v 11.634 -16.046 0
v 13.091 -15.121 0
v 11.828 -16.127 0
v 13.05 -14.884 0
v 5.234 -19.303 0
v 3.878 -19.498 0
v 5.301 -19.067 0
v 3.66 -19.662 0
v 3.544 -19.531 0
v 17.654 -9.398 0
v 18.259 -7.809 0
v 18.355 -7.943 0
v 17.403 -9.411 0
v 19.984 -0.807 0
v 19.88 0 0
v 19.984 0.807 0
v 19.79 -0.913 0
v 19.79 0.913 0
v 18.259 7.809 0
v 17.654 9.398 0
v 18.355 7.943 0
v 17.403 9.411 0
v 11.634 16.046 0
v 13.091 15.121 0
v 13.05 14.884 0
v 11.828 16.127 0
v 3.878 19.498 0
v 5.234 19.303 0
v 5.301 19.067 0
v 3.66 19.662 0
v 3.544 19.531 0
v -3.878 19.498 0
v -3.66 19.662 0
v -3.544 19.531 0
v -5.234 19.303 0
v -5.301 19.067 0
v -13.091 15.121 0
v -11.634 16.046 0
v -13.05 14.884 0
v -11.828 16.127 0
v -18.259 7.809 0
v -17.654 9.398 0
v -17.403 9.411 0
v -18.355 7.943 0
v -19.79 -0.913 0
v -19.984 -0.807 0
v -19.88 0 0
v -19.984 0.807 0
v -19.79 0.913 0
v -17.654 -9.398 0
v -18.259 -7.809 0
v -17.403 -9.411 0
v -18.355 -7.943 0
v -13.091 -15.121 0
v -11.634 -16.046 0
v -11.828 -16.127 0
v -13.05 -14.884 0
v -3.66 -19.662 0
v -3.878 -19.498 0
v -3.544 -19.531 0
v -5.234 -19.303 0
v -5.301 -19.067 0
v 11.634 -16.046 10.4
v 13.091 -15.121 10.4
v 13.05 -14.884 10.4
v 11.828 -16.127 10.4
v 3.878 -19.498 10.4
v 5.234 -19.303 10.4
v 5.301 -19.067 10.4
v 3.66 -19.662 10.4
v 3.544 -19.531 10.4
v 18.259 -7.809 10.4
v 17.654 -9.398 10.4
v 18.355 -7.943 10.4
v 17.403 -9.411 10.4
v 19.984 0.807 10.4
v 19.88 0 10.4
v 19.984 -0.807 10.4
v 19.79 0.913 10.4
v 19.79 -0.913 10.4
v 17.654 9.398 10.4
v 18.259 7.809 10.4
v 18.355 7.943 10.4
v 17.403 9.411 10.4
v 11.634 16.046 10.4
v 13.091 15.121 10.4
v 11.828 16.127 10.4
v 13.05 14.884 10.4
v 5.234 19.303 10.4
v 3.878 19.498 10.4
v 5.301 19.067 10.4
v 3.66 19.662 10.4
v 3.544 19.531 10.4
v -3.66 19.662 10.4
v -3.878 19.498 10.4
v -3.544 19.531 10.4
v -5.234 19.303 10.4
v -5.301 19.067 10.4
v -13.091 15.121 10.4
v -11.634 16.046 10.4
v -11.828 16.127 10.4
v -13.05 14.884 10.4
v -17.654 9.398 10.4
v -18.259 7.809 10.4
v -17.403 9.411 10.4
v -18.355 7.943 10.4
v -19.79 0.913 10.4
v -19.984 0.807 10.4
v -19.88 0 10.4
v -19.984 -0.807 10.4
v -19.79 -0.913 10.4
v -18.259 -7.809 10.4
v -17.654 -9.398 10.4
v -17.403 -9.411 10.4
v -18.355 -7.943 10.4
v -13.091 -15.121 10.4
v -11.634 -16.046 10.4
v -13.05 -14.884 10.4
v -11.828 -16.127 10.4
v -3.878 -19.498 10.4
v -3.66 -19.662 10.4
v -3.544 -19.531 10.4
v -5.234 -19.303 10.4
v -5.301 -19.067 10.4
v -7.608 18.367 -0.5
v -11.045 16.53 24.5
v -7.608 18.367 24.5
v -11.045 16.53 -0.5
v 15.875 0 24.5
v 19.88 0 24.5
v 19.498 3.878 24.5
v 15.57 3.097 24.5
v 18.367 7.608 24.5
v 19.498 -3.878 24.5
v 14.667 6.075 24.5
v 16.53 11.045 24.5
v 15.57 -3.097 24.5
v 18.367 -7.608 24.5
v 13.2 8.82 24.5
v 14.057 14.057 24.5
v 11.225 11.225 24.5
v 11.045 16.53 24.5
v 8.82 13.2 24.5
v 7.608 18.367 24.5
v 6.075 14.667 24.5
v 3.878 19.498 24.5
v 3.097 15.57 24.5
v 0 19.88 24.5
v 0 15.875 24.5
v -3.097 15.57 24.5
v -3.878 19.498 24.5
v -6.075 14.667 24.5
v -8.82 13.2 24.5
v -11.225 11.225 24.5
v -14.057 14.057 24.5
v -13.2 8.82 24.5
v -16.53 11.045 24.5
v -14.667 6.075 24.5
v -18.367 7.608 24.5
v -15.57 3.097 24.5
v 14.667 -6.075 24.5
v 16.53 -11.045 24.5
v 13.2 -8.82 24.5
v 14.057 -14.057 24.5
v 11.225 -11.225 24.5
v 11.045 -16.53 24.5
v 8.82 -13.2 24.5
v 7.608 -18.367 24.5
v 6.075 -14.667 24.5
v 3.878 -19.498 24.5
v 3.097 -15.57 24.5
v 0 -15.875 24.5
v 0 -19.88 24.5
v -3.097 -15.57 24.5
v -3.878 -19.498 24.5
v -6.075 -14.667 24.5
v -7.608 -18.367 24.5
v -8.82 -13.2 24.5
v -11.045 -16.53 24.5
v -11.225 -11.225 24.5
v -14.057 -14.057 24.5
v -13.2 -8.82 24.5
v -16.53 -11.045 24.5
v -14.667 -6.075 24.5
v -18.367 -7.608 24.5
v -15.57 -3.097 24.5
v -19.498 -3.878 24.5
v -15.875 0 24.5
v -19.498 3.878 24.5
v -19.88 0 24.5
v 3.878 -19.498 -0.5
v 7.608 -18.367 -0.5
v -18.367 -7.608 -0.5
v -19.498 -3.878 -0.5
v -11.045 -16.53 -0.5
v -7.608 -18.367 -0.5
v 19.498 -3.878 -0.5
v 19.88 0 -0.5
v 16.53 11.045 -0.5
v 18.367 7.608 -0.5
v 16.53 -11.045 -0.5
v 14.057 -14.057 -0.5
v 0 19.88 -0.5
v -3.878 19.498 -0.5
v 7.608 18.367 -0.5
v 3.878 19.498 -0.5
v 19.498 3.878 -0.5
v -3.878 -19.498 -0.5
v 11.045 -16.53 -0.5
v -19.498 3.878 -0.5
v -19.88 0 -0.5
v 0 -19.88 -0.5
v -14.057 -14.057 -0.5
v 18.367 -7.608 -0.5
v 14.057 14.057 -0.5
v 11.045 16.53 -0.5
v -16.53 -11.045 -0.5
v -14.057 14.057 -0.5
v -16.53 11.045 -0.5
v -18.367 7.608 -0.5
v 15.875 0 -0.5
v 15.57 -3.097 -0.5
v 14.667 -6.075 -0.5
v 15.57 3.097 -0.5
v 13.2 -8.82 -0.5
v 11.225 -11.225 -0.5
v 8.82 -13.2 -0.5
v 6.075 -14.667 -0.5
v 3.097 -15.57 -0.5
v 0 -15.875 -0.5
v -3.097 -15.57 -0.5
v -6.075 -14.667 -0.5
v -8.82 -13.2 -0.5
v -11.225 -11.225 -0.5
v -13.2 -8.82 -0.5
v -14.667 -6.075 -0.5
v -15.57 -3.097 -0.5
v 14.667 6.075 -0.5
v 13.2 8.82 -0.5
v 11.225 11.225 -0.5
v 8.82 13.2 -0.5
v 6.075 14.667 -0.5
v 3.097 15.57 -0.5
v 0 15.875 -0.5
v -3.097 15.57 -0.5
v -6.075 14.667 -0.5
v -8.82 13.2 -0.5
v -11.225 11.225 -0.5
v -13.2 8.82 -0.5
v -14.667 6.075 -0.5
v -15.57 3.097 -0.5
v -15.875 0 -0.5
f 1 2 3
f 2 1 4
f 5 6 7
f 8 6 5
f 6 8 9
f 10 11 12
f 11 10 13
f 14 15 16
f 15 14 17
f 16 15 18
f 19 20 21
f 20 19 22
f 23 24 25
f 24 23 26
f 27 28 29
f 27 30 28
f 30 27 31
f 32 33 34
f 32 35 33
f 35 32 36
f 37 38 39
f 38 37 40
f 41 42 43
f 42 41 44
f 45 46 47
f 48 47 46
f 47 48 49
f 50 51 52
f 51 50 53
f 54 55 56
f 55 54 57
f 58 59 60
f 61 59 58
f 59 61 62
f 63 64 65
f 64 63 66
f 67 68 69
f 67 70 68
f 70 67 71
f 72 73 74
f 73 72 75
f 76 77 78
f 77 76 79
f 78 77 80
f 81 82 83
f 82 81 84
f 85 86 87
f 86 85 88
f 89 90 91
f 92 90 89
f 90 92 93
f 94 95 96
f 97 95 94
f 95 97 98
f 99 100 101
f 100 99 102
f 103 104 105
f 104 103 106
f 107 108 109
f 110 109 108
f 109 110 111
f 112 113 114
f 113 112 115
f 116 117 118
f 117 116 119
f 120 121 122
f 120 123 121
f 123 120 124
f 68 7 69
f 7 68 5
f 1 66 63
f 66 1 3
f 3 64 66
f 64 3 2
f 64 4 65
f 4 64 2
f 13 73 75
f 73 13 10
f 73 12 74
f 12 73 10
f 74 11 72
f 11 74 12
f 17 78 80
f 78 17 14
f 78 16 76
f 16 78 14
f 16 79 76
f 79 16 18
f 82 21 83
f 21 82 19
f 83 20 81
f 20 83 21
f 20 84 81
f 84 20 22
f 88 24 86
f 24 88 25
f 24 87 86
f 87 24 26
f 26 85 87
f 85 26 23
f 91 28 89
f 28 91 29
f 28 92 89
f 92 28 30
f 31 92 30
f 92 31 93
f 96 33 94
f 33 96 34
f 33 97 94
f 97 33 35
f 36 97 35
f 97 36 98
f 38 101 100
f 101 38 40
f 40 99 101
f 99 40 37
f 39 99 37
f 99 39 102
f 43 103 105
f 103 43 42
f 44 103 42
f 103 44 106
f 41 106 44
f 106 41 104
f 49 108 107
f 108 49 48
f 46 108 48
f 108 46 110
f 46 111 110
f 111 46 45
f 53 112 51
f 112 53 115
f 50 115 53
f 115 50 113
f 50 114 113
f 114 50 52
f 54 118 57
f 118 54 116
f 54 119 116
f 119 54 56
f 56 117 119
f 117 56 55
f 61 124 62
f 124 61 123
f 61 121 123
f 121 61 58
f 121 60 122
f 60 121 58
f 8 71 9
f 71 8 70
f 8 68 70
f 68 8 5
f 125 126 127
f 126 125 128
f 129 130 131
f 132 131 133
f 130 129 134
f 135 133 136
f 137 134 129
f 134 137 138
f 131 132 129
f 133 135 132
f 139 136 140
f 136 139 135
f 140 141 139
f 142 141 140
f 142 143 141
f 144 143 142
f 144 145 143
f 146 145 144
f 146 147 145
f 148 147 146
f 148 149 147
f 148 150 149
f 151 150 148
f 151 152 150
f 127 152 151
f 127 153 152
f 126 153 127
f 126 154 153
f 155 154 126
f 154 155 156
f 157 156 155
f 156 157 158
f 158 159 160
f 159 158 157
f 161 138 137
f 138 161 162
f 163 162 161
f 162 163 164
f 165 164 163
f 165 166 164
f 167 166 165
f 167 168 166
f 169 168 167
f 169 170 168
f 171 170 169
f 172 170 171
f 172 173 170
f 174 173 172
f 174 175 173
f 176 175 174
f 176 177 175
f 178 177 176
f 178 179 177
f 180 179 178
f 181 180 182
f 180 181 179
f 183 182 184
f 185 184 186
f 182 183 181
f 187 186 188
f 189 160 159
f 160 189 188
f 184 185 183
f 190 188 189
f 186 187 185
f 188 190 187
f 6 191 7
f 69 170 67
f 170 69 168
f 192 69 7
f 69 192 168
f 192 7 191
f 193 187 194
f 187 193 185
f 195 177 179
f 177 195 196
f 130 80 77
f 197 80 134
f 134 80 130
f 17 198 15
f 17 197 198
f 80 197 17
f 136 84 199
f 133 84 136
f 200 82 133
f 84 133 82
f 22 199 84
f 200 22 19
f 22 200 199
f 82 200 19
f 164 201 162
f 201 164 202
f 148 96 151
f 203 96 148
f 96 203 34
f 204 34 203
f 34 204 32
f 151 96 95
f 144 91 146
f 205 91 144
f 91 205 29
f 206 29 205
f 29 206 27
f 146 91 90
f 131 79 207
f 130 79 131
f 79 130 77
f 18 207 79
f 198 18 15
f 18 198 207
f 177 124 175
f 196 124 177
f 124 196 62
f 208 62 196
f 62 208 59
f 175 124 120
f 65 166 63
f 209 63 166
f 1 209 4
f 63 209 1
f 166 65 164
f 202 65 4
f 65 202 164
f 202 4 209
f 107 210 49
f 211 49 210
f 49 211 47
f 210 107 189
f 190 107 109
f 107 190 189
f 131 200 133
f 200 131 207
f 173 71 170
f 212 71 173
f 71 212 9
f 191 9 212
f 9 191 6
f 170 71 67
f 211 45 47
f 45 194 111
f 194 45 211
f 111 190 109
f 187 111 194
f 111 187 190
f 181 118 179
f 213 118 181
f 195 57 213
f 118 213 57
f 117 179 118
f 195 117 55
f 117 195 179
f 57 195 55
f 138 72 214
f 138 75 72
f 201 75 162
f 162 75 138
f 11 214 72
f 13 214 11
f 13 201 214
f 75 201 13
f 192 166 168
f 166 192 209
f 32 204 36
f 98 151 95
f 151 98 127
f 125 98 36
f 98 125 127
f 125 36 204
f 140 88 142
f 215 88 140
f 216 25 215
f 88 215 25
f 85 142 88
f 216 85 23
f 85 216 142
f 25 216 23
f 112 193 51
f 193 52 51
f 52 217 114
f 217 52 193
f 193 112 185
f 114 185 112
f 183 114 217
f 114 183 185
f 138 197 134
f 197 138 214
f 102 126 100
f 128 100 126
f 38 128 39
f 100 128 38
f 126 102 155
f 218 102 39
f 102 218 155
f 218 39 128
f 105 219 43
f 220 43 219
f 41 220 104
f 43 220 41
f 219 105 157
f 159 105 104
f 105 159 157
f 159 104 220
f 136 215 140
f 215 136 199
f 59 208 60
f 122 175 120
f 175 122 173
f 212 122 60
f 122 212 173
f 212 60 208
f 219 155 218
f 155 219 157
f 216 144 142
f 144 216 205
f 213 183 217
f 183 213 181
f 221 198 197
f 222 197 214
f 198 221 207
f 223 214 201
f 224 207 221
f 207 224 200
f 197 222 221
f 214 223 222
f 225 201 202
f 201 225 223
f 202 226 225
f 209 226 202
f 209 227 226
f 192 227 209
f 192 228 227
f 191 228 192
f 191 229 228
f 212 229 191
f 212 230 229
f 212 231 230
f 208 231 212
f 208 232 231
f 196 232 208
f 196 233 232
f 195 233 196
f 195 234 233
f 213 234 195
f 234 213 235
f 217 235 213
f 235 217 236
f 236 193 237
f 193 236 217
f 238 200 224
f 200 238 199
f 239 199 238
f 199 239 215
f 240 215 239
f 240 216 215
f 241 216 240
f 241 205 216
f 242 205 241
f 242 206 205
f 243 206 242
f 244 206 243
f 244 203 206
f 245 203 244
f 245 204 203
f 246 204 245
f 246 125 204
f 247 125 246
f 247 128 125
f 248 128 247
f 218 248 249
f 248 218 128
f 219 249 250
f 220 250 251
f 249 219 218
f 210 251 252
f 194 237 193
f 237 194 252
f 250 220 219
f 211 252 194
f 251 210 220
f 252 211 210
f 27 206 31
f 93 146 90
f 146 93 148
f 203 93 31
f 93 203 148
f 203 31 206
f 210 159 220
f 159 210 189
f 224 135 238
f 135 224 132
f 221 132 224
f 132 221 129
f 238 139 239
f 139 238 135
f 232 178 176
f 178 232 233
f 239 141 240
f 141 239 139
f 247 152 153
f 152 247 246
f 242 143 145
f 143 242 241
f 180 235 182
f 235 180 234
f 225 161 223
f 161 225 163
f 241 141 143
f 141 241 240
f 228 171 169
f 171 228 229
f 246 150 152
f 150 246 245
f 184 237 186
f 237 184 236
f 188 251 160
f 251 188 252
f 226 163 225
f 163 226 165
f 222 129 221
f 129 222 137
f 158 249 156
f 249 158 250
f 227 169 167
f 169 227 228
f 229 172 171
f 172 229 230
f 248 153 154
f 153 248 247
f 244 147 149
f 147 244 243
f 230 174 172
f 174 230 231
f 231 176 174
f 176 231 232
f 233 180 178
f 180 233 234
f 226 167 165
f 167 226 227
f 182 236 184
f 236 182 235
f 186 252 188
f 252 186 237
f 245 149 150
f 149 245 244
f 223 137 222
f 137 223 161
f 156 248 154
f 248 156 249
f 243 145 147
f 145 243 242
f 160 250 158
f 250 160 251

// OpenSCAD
$fn = 32;

// ----------------------------------------------------------------------
// Two-module gear rim: z14 m2.5 and z20 m1.5, 24 mm wide
// ----------------------------------------------------------------------

// --- parameters (mm) ---
module_a = 2.5;           // first tooth module
teeth_a = 14;             // first band tooth count
module_b = 1.5;           // second tooth module
teeth_b = 20;             // second band tooth count
band_h = 10;              // height of one tooth band
web_t = 4;                // web thickness between the bands
total = 24;               // overall width over both bands
root_r = 14.38;           // root radius of the coarse band
hub_r = 19.88;            // hub radius
bore_d = 31.75;           // hub bore
hole_count = 4;           // lightening holes
hole_r = 10.94;           // lightening hole circle radius
hole_d = 4;               // lightening hole diameter

band_a = [[14.259, -1.82], [17.559, -1.916], [18.774, -1.469], [19.984, -0.807], [19.984, 0.807], [18.774, 1.469], [17.559, 1.916], [14.259, 1.82], [13.637, 4.547], [16.651, 5.892], [17.552, 6.823], [18.355, 7.943], [17.654, 9.398], [16.278, 9.469], [14.989, 9.345], [12.058, 7.827], [10.313, 10.014], [12.446, 12.533], [12.854, 13.763], [13.091, 15.121], [11.828, 16.127], [10.557, 15.594], [9.45, 14.923], [7.468, 12.283], [4.947, 13.497], [5.775, 16.692], [5.609, 17.977], [5.234, 19.303], [3.66, 19.662], [2.746, 18.63], [2.039, 17.545], [1.399, 14.307], [-1.399, 14.307], [-2.039, 17.545], [-2.746, 18.63], [-3.66, 19.662], [-5.234, 19.303], [-5.609, 17.977], [-5.775, 16.692], [-4.947, 13.497], [-7.468, 12.283], [-9.45, 14.923], [-10.557, 15.594], [-11.828, 16.127], [-13.091, 15.121], [-12.854, 13.763], [-12.446, 12.533], [-10.313, 10.014], [-12.058, 7.827], [-14.989, 9.345], [-16.278, 9.469], [-17.654, 9.398], [-18.355, 7.943], [-17.552, 6.823], [-16.651, 5.892], [-13.637, 4.547], [-14.259, 1.82], [-17.559, 1.916], [-18.774, 1.469], [-19.984, 0.807], [-19.984, -0.807], [-18.774, -1.469], [-17.559, -1.916], [-14.259, -1.82], [-13.637, -4.547], [-16.651, -5.892], [-17.552, -6.823], [-18.355, -7.943], [-17.654, -9.398], [-16.278, -9.469], [-14.989, -9.345], [-12.058, -7.827], [-10.313, -10.014], [-12.446, -12.533], [-12.854, -13.763], [-13.091, -15.121], [-11.828, -16.127], [-10.557, -15.594], [-9.45, -14.923], [-7.468, -12.283], [-4.947, -13.497], [-5.775, -16.692], [-5.609, -17.977], [-5.234, -19.303], [-3.66, -19.662], [-2.746, -18.63], [-2.039, -17.545], [-1.399, -14.307], [1.399, -14.307], [2.039, -17.545], [2.746, -18.63], [3.66, -19.662], [5.234, -19.303], [5.609, -17.977], [5.775, -16.692], [4.947, -13.497], [7.468, -12.283], [9.45, -14.923], [10.557, -15.594], [11.828, -16.127], [13.091, -15.121], [12.854, -13.763], [12.446, -12.533], [10.313, -10.014], [12.058, -7.827], [14.989, -9.345], [16.278, -9.469], [17.654, -9.398], [18.355, -7.943], [17.552, -6.823], [16.651, -5.892], [13.637, -4.547]];
band_b = [[13.068, -1.222], [14.882, -1.196], [15.688, -0.918], [16.492, -0.521], [16.492, 0.521], [15.688, 0.918], [14.882, 1.196], [13.068, 1.222], [12.806, 2.876], [14.524, 3.461], [15.204, 3.974], [15.846, 4.601], [15.524, 5.592], [14.637, 5.721], [13.784, 5.736], [12.051, 5.2], [11.291, 6.692], [12.743, 7.78], [13.232, 8.478], [13.648, 9.272], [13.036, 10.115], [12.152, 9.964], [11.337, 9.715], [9.854, 8.67], [8.67, 9.854], [9.715, 11.337], [9.964, 12.152], [10.115, 13.036], [9.272, 13.648], [8.478, 13.232], [7.78, 12.743], [6.692, 11.291], [5.2, 12.051], [5.736, 13.784], [5.721, 14.637], [5.592, 15.524], [4.601, 15.846], [3.974, 15.204], [3.461, 14.524], [2.876, 12.806], [1.222, 13.068], [1.196, 14.882], [0.918, 15.688], [0.521, 16.492], [-0.521, 16.492], [-0.918, 15.688], [-1.196, 14.882], [-1.222, 13.068], [-2.876, 12.806], [-3.461, 14.524], [-3.974, 15.204], [-4.601, 15.846], [-5.592, 15.524], [-5.721, 14.637], [-5.736, 13.784], [-5.2, 12.051], [-6.692, 11.291], [-7.78, 12.743], [-8.478, 13.232], [-9.272, 13.648], [-10.115, 13.036], [-9.964, 12.152], [-9.715, 11.337], [-8.67, 9.854], [-9.854, 8.67], [-11.337, 9.715], [-12.152, 9.964], [-13.036, 10.115], [-13.648, 9.272], [-13.232, 8.478], [-12.743, 7.78], [-11.291, 6.692], [-12.051, 5.2], [-13.784, 5.736], [-14.637, 5.721], [-15.524, 5.592], [-15.846, 4.601], [-15.204, 3.974], [-14.524, 3.461], [-12.806, 2.876], [-13.068, 1.222], [-14.882, 1.196], [-15.688, 0.918], [-16.492, 0.521], [-16.492, -0.521], [-15.688, -0.918], [-14.882, -1.196], [-13.068, -1.222], [-12.806, -2.876], [-14.524, -3.461], [-15.204, -3.974], [-15.846, -4.601], [-15.524, -5.592], [-14.637, -5.721], [-13.784, -5.736], [-12.051, -5.2], [-11.291, -6.692], [-12.743, -7.78], [-13.232, -8.478], [-13.648, -9.272], [-13.036, -10.115], [-12.152, -9.964], [-11.337, -9.715], [-9.854, -8.67], [-8.67, -9.854], [-9.715, -11.337], [-9.964, -12.152], [-10.115, -13.036], [-9.272, -13.648], [-8.478, -13.232], [-7.78, -12.743], [-6.692, -11.291], [-5.2, -12.051], [-5.736, -13.784], [-5.721, -14.637], [-5.592, -15.524], [-4.601, -15.846], [-3.974, -15.204], [-3.461, -14.524], [-2.876, -12.806], [-1.222, -13.068], [-1.196, -14.882], [-0.918, -15.688], [-0.521, -16.492], [0.521, -16.492], [0.918, -15.688], [1.196, -14.882], [1.222, -13.068], [2.876, -12.806], [3.461, -14.524], [3.974, -15.204], [4.601, -15.846], [5.592, -15.524], [5.721, -14.637], [5.736, -13.784], [5.2, -12.051], [6.692, -11.291], [7.78, -12.743], [8.478, -13.232], [9.272, -13.648], [10.115, -13.036], [9.964, -12.152], [9.715, -11.337], [8.67, -9.854], [9.854, -8.67], [11.337, -9.715], [12.152, -9.964], [13.036, -10.115], [13.648, -9.272], [13.232, -8.478], [12.743, -7.78], [11.291, -6.692], [12.051, -5.2], [13.784, -5.736], [14.637, -5.721], [15.524, -5.592], [15.846, -4.601], [15.204, -3.974], [14.524, -3.461], [12.806, -2.876]];

difference() {
  union() {
    /* tooth band A, overlapping the web by 0.4 mm */
    linear_extrude(height = band_h + 0.4) polygon(band_a);
    /* web */
    translate([0, 0, band_h - 0.4]) cylinder(h = web_t + 0.8, d = 2 * root_r);
    /* tooth band B */
    translate([0, 0, band_h + web_t]) linear_extrude(height = band_h + 0.4) polygon(band_b);
    /* hub */
    translate([0, 0, -0.5]) cylinder(h = total + 1.0, d = 2 * hub_r);
  }
  /* bore */
  translate([0, 0, -2.5]) cylinder(h = total + 5, d = bore_d);
  /* lightening holes through the web */
  for (i = [0 : hole_count - 1]) {
    a = i * 360 / hole_count;
    translate([hole_r * cos(a), hole_r * sin(a), -2.5]) cylinder(h = total + 5, d = hole_d);
  }
}
